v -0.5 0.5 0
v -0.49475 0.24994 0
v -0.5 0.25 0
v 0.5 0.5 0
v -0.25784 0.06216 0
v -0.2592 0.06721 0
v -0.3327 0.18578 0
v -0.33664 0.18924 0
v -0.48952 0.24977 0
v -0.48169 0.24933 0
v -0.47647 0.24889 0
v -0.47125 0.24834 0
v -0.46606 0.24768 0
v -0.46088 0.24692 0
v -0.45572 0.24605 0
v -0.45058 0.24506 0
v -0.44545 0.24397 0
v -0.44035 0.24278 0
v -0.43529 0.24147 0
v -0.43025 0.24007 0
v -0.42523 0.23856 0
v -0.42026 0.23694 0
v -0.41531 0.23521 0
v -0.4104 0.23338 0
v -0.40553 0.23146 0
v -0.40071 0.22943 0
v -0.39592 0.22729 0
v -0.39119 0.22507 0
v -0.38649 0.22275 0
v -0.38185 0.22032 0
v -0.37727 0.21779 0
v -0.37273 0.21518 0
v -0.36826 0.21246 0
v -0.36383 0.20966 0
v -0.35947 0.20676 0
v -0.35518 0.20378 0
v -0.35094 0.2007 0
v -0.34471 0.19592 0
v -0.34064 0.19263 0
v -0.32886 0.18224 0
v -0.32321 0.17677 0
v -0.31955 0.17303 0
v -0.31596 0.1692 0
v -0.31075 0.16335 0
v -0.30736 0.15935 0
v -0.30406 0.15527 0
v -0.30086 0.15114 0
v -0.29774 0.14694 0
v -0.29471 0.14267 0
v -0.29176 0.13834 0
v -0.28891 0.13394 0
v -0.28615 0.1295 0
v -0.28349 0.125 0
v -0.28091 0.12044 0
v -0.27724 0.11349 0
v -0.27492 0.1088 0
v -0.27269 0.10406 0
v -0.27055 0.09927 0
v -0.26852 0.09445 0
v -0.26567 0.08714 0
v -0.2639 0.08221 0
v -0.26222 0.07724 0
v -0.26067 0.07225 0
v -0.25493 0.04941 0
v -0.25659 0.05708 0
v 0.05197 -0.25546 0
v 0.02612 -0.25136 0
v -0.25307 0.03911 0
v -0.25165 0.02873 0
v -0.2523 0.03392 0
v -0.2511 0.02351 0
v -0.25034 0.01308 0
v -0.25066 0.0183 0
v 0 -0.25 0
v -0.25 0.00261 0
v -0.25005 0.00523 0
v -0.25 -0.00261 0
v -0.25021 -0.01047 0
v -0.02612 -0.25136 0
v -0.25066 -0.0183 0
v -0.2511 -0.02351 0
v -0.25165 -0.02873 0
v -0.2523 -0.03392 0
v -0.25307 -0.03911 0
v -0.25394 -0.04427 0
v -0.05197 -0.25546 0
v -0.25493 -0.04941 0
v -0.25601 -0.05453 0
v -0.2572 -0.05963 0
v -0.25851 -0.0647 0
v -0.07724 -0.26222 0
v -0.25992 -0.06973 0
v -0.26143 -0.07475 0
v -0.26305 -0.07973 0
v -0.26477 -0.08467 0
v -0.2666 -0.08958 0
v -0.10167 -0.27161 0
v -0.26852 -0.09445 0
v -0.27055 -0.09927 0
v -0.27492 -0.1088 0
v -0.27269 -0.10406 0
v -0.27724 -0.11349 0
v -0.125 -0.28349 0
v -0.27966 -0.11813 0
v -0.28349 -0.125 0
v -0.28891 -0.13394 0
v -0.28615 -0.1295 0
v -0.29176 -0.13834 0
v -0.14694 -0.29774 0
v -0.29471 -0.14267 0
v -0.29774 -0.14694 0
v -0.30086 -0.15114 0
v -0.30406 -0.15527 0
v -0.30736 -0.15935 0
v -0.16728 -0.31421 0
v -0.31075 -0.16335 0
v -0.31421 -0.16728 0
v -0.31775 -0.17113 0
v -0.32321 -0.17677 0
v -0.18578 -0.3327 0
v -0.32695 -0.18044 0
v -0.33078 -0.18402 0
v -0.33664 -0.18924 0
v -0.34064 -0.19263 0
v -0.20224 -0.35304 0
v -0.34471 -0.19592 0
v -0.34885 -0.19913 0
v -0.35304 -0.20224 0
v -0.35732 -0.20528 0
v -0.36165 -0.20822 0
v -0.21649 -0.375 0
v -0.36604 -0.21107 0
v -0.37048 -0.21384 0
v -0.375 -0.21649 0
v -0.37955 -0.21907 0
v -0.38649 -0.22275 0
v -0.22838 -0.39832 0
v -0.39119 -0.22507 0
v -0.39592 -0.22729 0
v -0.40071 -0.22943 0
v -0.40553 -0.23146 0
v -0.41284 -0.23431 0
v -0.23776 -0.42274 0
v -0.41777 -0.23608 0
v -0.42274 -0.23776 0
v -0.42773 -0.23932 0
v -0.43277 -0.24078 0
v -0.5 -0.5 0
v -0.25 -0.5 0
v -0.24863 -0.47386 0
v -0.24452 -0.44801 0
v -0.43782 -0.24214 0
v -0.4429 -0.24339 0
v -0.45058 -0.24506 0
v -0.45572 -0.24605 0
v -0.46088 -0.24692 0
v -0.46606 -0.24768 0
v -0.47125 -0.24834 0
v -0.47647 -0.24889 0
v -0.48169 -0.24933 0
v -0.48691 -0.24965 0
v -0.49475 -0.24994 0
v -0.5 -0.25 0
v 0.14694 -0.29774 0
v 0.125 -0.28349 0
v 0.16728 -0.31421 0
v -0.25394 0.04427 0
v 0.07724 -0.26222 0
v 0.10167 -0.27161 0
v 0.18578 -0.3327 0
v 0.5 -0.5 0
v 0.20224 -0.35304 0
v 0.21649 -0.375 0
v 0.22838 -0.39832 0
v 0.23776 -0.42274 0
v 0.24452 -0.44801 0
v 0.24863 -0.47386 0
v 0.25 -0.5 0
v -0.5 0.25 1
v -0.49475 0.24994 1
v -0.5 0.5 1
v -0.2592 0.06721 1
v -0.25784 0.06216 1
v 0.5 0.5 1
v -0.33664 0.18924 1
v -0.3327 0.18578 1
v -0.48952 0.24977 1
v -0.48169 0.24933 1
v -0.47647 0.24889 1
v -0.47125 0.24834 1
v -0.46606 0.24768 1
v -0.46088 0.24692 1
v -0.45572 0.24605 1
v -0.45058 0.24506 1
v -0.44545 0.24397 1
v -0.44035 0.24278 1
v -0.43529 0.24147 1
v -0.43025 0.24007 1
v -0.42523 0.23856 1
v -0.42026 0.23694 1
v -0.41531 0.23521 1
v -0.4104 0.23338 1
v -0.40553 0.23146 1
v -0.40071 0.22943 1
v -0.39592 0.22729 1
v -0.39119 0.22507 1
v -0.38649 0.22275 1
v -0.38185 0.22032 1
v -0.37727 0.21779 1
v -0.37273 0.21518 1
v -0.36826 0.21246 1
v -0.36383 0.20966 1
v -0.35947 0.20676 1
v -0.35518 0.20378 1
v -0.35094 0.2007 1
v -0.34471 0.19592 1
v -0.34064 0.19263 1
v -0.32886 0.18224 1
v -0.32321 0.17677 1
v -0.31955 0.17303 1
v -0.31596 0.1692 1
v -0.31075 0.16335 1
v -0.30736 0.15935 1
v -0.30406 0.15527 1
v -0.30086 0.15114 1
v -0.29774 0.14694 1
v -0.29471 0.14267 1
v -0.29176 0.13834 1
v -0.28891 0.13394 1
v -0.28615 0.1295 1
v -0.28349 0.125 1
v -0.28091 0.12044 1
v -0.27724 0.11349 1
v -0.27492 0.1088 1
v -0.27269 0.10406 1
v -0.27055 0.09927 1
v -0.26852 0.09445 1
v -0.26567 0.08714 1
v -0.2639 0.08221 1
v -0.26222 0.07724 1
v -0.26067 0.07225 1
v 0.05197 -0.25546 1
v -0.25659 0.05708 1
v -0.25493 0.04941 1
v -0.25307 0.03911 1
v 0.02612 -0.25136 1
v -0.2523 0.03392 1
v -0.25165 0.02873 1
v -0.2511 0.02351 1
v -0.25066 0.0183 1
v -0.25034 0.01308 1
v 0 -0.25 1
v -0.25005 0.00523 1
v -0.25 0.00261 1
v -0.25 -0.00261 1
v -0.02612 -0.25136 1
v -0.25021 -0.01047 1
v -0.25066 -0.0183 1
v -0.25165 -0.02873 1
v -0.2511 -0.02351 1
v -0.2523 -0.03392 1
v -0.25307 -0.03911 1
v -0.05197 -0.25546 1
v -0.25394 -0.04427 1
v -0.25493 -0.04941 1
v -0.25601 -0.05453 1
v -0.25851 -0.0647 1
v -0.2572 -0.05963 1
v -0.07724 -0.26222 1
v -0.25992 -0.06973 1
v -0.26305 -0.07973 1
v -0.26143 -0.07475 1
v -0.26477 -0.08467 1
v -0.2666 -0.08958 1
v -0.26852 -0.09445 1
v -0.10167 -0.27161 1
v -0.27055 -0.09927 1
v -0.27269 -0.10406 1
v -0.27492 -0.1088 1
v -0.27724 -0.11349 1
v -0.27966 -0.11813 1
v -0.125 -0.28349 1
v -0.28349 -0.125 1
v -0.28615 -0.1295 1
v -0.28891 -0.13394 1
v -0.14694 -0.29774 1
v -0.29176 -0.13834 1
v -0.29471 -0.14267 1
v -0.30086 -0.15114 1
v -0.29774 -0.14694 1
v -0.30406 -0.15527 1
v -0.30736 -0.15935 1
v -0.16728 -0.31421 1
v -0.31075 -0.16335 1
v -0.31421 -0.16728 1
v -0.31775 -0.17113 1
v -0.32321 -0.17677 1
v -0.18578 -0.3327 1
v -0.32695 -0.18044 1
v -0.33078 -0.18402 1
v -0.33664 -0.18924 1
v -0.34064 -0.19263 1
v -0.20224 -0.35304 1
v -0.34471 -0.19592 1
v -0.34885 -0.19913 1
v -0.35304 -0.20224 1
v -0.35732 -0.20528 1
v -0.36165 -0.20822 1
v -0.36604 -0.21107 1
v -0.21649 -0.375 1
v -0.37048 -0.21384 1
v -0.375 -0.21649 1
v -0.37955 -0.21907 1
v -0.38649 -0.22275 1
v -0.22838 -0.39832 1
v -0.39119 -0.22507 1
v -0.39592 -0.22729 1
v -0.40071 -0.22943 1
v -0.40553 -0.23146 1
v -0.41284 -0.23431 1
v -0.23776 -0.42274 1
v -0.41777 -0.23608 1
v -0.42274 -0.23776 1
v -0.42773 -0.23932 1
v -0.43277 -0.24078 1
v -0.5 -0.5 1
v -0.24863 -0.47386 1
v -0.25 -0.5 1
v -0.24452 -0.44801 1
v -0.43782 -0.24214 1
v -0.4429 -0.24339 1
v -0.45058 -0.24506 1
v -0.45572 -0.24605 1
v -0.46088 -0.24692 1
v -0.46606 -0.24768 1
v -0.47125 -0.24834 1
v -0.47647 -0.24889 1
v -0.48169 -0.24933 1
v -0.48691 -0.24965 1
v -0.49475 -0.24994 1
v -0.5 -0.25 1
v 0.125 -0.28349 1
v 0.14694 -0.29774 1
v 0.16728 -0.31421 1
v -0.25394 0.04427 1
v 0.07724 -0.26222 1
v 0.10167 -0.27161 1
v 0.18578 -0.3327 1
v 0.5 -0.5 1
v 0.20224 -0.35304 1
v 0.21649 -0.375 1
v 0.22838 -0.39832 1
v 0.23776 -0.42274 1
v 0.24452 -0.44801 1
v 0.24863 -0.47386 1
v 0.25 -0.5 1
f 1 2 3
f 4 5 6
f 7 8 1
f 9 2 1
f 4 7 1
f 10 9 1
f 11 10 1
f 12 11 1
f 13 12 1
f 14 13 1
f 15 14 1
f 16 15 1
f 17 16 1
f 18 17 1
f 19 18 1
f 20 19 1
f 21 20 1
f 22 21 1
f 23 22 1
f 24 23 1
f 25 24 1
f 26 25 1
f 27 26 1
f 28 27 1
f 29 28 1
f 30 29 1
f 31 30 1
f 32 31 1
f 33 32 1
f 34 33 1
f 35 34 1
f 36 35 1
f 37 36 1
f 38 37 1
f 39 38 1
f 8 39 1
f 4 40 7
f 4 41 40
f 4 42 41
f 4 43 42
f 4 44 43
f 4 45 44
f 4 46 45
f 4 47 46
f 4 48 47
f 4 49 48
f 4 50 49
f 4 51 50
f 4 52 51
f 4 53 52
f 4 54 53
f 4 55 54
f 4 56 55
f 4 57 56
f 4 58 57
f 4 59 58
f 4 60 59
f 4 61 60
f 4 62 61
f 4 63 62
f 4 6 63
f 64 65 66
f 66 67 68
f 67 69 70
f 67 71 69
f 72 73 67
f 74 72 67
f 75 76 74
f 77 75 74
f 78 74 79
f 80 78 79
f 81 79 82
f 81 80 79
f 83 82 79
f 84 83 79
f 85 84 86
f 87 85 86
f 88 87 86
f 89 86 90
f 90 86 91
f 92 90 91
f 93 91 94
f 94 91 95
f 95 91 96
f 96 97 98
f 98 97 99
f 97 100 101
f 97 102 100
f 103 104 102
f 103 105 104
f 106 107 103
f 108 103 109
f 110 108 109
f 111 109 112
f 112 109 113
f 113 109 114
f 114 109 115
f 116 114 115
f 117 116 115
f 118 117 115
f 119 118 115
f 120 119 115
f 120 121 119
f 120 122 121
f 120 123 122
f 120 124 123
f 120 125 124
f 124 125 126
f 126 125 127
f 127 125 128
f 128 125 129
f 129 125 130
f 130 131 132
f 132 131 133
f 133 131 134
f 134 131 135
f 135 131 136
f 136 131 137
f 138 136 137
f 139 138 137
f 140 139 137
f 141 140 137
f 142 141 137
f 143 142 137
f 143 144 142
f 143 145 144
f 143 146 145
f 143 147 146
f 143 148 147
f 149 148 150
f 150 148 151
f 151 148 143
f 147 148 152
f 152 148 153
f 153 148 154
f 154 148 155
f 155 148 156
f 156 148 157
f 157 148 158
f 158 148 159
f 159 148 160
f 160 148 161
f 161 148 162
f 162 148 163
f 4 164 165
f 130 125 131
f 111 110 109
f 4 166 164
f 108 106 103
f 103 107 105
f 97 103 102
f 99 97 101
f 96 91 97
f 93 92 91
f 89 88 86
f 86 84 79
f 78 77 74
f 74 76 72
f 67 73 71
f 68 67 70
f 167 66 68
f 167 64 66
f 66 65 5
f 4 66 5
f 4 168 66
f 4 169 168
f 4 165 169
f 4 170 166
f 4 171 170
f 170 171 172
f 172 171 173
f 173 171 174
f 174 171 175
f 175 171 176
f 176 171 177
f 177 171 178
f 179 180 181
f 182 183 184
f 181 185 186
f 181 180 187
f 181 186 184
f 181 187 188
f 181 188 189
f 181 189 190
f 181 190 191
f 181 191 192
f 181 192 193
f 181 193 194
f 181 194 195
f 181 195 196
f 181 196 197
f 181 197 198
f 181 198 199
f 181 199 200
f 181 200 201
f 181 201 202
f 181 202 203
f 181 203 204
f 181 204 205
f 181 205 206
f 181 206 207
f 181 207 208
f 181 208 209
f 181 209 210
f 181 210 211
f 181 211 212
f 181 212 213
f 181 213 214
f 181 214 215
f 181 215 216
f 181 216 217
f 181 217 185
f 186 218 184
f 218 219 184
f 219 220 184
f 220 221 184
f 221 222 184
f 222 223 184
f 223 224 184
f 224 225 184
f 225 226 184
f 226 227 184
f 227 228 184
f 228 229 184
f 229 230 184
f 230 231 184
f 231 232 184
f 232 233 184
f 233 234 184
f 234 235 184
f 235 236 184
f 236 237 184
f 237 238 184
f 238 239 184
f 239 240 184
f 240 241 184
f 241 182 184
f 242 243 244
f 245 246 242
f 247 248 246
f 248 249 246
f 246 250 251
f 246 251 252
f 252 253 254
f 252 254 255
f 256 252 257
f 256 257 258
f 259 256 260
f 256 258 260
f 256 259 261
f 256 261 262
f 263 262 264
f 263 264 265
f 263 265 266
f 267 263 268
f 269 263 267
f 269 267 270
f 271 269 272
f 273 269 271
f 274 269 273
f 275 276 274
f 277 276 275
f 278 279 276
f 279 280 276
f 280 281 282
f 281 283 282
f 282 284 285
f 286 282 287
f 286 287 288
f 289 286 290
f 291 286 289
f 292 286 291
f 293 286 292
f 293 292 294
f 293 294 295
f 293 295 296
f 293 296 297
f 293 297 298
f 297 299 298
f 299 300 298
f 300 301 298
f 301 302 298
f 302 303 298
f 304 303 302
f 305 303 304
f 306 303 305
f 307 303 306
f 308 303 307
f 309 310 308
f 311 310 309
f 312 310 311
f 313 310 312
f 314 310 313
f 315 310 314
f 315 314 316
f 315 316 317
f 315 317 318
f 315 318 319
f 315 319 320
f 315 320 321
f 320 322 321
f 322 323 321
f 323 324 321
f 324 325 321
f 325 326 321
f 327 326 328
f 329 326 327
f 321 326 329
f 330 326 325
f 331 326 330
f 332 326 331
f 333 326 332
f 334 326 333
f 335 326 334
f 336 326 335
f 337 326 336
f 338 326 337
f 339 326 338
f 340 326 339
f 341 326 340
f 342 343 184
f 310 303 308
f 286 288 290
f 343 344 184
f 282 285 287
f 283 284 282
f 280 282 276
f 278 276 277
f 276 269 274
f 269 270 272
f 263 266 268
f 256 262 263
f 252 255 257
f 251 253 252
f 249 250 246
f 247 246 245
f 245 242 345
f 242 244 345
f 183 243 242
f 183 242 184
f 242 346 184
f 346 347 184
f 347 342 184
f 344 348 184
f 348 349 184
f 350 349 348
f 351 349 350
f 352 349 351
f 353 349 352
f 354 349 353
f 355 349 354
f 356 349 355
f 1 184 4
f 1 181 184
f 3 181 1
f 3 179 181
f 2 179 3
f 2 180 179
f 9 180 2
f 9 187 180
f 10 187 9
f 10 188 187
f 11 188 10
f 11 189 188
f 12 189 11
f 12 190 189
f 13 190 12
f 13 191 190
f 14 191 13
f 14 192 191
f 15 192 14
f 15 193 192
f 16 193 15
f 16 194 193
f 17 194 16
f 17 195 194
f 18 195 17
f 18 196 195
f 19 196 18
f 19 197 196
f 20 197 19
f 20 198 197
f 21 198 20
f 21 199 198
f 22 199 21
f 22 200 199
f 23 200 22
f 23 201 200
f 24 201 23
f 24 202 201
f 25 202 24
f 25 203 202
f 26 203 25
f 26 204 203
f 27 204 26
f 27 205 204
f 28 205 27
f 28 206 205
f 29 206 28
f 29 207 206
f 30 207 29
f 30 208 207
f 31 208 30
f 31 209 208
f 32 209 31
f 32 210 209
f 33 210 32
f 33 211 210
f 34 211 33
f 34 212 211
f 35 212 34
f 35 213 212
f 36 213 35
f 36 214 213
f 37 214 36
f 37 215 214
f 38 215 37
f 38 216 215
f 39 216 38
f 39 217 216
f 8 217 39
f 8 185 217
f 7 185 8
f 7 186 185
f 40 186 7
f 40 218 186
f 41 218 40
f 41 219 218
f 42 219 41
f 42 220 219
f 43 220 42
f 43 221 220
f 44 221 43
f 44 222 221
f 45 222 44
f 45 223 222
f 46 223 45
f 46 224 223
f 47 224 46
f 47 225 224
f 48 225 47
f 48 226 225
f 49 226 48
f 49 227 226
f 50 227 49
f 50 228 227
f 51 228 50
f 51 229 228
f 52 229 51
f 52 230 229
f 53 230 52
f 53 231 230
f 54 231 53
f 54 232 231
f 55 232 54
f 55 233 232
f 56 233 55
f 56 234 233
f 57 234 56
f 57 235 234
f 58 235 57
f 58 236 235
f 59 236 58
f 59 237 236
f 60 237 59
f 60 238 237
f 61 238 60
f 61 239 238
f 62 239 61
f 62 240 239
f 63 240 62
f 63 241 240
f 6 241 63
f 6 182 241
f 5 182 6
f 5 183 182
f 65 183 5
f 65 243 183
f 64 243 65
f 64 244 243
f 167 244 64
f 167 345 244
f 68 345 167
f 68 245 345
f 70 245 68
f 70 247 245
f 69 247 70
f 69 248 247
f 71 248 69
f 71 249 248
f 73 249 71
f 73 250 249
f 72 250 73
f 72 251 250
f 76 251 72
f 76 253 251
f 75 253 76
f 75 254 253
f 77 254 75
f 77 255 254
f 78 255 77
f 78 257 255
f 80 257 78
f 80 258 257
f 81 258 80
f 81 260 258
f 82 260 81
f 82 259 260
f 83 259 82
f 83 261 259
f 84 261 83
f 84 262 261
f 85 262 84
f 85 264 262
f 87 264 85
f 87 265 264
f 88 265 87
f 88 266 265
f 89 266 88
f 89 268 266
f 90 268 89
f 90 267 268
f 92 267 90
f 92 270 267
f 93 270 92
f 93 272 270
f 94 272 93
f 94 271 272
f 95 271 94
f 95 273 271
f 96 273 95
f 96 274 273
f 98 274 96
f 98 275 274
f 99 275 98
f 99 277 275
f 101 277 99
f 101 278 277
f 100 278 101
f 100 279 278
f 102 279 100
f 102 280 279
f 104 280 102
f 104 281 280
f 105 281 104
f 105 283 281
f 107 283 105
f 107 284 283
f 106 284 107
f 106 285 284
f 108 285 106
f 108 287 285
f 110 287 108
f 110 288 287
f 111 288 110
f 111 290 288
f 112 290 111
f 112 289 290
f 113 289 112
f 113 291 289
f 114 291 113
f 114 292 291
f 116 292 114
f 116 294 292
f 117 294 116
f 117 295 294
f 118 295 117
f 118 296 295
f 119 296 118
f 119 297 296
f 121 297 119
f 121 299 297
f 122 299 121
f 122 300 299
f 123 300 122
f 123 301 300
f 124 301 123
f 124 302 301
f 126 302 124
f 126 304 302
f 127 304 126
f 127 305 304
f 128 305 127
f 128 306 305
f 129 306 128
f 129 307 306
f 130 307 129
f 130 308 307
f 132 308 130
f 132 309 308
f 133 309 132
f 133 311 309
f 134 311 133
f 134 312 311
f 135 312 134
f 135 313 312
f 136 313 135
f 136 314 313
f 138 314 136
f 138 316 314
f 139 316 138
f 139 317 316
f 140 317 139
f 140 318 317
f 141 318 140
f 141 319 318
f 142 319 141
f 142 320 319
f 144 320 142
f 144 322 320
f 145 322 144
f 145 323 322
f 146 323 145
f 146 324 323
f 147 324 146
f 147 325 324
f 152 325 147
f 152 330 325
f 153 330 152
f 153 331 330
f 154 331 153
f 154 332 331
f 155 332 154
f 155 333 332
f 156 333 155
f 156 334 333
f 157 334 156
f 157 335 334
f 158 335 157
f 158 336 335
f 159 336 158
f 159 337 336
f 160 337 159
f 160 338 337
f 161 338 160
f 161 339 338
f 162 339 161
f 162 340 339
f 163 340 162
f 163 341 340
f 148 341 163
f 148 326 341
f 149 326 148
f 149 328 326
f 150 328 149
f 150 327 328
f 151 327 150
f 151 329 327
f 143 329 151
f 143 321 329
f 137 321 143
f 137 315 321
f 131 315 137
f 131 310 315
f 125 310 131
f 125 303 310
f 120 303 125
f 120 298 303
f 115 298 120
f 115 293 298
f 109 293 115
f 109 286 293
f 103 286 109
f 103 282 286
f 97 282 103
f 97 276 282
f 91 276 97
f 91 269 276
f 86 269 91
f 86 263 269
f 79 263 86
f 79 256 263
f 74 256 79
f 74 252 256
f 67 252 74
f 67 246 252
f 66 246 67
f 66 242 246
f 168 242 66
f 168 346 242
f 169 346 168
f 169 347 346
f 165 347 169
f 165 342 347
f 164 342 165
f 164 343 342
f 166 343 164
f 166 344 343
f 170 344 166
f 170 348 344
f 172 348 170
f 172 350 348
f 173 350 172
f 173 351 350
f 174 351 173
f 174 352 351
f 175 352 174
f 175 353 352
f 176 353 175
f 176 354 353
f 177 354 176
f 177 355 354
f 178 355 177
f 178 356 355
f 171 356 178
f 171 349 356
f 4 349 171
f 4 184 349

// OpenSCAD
linear_extrude(height=1)
difference() {
    square([1,1], center=true);
    translate([0, -0.5]) circle(r=0.25, $fn=60); // polygon cleanup doesn't touch our circle at this scale
    translate([-0.5, 0]) circle(r=0.25, $fn=600);// shows up much more coarse if polygon cleaning distance is too large
}
